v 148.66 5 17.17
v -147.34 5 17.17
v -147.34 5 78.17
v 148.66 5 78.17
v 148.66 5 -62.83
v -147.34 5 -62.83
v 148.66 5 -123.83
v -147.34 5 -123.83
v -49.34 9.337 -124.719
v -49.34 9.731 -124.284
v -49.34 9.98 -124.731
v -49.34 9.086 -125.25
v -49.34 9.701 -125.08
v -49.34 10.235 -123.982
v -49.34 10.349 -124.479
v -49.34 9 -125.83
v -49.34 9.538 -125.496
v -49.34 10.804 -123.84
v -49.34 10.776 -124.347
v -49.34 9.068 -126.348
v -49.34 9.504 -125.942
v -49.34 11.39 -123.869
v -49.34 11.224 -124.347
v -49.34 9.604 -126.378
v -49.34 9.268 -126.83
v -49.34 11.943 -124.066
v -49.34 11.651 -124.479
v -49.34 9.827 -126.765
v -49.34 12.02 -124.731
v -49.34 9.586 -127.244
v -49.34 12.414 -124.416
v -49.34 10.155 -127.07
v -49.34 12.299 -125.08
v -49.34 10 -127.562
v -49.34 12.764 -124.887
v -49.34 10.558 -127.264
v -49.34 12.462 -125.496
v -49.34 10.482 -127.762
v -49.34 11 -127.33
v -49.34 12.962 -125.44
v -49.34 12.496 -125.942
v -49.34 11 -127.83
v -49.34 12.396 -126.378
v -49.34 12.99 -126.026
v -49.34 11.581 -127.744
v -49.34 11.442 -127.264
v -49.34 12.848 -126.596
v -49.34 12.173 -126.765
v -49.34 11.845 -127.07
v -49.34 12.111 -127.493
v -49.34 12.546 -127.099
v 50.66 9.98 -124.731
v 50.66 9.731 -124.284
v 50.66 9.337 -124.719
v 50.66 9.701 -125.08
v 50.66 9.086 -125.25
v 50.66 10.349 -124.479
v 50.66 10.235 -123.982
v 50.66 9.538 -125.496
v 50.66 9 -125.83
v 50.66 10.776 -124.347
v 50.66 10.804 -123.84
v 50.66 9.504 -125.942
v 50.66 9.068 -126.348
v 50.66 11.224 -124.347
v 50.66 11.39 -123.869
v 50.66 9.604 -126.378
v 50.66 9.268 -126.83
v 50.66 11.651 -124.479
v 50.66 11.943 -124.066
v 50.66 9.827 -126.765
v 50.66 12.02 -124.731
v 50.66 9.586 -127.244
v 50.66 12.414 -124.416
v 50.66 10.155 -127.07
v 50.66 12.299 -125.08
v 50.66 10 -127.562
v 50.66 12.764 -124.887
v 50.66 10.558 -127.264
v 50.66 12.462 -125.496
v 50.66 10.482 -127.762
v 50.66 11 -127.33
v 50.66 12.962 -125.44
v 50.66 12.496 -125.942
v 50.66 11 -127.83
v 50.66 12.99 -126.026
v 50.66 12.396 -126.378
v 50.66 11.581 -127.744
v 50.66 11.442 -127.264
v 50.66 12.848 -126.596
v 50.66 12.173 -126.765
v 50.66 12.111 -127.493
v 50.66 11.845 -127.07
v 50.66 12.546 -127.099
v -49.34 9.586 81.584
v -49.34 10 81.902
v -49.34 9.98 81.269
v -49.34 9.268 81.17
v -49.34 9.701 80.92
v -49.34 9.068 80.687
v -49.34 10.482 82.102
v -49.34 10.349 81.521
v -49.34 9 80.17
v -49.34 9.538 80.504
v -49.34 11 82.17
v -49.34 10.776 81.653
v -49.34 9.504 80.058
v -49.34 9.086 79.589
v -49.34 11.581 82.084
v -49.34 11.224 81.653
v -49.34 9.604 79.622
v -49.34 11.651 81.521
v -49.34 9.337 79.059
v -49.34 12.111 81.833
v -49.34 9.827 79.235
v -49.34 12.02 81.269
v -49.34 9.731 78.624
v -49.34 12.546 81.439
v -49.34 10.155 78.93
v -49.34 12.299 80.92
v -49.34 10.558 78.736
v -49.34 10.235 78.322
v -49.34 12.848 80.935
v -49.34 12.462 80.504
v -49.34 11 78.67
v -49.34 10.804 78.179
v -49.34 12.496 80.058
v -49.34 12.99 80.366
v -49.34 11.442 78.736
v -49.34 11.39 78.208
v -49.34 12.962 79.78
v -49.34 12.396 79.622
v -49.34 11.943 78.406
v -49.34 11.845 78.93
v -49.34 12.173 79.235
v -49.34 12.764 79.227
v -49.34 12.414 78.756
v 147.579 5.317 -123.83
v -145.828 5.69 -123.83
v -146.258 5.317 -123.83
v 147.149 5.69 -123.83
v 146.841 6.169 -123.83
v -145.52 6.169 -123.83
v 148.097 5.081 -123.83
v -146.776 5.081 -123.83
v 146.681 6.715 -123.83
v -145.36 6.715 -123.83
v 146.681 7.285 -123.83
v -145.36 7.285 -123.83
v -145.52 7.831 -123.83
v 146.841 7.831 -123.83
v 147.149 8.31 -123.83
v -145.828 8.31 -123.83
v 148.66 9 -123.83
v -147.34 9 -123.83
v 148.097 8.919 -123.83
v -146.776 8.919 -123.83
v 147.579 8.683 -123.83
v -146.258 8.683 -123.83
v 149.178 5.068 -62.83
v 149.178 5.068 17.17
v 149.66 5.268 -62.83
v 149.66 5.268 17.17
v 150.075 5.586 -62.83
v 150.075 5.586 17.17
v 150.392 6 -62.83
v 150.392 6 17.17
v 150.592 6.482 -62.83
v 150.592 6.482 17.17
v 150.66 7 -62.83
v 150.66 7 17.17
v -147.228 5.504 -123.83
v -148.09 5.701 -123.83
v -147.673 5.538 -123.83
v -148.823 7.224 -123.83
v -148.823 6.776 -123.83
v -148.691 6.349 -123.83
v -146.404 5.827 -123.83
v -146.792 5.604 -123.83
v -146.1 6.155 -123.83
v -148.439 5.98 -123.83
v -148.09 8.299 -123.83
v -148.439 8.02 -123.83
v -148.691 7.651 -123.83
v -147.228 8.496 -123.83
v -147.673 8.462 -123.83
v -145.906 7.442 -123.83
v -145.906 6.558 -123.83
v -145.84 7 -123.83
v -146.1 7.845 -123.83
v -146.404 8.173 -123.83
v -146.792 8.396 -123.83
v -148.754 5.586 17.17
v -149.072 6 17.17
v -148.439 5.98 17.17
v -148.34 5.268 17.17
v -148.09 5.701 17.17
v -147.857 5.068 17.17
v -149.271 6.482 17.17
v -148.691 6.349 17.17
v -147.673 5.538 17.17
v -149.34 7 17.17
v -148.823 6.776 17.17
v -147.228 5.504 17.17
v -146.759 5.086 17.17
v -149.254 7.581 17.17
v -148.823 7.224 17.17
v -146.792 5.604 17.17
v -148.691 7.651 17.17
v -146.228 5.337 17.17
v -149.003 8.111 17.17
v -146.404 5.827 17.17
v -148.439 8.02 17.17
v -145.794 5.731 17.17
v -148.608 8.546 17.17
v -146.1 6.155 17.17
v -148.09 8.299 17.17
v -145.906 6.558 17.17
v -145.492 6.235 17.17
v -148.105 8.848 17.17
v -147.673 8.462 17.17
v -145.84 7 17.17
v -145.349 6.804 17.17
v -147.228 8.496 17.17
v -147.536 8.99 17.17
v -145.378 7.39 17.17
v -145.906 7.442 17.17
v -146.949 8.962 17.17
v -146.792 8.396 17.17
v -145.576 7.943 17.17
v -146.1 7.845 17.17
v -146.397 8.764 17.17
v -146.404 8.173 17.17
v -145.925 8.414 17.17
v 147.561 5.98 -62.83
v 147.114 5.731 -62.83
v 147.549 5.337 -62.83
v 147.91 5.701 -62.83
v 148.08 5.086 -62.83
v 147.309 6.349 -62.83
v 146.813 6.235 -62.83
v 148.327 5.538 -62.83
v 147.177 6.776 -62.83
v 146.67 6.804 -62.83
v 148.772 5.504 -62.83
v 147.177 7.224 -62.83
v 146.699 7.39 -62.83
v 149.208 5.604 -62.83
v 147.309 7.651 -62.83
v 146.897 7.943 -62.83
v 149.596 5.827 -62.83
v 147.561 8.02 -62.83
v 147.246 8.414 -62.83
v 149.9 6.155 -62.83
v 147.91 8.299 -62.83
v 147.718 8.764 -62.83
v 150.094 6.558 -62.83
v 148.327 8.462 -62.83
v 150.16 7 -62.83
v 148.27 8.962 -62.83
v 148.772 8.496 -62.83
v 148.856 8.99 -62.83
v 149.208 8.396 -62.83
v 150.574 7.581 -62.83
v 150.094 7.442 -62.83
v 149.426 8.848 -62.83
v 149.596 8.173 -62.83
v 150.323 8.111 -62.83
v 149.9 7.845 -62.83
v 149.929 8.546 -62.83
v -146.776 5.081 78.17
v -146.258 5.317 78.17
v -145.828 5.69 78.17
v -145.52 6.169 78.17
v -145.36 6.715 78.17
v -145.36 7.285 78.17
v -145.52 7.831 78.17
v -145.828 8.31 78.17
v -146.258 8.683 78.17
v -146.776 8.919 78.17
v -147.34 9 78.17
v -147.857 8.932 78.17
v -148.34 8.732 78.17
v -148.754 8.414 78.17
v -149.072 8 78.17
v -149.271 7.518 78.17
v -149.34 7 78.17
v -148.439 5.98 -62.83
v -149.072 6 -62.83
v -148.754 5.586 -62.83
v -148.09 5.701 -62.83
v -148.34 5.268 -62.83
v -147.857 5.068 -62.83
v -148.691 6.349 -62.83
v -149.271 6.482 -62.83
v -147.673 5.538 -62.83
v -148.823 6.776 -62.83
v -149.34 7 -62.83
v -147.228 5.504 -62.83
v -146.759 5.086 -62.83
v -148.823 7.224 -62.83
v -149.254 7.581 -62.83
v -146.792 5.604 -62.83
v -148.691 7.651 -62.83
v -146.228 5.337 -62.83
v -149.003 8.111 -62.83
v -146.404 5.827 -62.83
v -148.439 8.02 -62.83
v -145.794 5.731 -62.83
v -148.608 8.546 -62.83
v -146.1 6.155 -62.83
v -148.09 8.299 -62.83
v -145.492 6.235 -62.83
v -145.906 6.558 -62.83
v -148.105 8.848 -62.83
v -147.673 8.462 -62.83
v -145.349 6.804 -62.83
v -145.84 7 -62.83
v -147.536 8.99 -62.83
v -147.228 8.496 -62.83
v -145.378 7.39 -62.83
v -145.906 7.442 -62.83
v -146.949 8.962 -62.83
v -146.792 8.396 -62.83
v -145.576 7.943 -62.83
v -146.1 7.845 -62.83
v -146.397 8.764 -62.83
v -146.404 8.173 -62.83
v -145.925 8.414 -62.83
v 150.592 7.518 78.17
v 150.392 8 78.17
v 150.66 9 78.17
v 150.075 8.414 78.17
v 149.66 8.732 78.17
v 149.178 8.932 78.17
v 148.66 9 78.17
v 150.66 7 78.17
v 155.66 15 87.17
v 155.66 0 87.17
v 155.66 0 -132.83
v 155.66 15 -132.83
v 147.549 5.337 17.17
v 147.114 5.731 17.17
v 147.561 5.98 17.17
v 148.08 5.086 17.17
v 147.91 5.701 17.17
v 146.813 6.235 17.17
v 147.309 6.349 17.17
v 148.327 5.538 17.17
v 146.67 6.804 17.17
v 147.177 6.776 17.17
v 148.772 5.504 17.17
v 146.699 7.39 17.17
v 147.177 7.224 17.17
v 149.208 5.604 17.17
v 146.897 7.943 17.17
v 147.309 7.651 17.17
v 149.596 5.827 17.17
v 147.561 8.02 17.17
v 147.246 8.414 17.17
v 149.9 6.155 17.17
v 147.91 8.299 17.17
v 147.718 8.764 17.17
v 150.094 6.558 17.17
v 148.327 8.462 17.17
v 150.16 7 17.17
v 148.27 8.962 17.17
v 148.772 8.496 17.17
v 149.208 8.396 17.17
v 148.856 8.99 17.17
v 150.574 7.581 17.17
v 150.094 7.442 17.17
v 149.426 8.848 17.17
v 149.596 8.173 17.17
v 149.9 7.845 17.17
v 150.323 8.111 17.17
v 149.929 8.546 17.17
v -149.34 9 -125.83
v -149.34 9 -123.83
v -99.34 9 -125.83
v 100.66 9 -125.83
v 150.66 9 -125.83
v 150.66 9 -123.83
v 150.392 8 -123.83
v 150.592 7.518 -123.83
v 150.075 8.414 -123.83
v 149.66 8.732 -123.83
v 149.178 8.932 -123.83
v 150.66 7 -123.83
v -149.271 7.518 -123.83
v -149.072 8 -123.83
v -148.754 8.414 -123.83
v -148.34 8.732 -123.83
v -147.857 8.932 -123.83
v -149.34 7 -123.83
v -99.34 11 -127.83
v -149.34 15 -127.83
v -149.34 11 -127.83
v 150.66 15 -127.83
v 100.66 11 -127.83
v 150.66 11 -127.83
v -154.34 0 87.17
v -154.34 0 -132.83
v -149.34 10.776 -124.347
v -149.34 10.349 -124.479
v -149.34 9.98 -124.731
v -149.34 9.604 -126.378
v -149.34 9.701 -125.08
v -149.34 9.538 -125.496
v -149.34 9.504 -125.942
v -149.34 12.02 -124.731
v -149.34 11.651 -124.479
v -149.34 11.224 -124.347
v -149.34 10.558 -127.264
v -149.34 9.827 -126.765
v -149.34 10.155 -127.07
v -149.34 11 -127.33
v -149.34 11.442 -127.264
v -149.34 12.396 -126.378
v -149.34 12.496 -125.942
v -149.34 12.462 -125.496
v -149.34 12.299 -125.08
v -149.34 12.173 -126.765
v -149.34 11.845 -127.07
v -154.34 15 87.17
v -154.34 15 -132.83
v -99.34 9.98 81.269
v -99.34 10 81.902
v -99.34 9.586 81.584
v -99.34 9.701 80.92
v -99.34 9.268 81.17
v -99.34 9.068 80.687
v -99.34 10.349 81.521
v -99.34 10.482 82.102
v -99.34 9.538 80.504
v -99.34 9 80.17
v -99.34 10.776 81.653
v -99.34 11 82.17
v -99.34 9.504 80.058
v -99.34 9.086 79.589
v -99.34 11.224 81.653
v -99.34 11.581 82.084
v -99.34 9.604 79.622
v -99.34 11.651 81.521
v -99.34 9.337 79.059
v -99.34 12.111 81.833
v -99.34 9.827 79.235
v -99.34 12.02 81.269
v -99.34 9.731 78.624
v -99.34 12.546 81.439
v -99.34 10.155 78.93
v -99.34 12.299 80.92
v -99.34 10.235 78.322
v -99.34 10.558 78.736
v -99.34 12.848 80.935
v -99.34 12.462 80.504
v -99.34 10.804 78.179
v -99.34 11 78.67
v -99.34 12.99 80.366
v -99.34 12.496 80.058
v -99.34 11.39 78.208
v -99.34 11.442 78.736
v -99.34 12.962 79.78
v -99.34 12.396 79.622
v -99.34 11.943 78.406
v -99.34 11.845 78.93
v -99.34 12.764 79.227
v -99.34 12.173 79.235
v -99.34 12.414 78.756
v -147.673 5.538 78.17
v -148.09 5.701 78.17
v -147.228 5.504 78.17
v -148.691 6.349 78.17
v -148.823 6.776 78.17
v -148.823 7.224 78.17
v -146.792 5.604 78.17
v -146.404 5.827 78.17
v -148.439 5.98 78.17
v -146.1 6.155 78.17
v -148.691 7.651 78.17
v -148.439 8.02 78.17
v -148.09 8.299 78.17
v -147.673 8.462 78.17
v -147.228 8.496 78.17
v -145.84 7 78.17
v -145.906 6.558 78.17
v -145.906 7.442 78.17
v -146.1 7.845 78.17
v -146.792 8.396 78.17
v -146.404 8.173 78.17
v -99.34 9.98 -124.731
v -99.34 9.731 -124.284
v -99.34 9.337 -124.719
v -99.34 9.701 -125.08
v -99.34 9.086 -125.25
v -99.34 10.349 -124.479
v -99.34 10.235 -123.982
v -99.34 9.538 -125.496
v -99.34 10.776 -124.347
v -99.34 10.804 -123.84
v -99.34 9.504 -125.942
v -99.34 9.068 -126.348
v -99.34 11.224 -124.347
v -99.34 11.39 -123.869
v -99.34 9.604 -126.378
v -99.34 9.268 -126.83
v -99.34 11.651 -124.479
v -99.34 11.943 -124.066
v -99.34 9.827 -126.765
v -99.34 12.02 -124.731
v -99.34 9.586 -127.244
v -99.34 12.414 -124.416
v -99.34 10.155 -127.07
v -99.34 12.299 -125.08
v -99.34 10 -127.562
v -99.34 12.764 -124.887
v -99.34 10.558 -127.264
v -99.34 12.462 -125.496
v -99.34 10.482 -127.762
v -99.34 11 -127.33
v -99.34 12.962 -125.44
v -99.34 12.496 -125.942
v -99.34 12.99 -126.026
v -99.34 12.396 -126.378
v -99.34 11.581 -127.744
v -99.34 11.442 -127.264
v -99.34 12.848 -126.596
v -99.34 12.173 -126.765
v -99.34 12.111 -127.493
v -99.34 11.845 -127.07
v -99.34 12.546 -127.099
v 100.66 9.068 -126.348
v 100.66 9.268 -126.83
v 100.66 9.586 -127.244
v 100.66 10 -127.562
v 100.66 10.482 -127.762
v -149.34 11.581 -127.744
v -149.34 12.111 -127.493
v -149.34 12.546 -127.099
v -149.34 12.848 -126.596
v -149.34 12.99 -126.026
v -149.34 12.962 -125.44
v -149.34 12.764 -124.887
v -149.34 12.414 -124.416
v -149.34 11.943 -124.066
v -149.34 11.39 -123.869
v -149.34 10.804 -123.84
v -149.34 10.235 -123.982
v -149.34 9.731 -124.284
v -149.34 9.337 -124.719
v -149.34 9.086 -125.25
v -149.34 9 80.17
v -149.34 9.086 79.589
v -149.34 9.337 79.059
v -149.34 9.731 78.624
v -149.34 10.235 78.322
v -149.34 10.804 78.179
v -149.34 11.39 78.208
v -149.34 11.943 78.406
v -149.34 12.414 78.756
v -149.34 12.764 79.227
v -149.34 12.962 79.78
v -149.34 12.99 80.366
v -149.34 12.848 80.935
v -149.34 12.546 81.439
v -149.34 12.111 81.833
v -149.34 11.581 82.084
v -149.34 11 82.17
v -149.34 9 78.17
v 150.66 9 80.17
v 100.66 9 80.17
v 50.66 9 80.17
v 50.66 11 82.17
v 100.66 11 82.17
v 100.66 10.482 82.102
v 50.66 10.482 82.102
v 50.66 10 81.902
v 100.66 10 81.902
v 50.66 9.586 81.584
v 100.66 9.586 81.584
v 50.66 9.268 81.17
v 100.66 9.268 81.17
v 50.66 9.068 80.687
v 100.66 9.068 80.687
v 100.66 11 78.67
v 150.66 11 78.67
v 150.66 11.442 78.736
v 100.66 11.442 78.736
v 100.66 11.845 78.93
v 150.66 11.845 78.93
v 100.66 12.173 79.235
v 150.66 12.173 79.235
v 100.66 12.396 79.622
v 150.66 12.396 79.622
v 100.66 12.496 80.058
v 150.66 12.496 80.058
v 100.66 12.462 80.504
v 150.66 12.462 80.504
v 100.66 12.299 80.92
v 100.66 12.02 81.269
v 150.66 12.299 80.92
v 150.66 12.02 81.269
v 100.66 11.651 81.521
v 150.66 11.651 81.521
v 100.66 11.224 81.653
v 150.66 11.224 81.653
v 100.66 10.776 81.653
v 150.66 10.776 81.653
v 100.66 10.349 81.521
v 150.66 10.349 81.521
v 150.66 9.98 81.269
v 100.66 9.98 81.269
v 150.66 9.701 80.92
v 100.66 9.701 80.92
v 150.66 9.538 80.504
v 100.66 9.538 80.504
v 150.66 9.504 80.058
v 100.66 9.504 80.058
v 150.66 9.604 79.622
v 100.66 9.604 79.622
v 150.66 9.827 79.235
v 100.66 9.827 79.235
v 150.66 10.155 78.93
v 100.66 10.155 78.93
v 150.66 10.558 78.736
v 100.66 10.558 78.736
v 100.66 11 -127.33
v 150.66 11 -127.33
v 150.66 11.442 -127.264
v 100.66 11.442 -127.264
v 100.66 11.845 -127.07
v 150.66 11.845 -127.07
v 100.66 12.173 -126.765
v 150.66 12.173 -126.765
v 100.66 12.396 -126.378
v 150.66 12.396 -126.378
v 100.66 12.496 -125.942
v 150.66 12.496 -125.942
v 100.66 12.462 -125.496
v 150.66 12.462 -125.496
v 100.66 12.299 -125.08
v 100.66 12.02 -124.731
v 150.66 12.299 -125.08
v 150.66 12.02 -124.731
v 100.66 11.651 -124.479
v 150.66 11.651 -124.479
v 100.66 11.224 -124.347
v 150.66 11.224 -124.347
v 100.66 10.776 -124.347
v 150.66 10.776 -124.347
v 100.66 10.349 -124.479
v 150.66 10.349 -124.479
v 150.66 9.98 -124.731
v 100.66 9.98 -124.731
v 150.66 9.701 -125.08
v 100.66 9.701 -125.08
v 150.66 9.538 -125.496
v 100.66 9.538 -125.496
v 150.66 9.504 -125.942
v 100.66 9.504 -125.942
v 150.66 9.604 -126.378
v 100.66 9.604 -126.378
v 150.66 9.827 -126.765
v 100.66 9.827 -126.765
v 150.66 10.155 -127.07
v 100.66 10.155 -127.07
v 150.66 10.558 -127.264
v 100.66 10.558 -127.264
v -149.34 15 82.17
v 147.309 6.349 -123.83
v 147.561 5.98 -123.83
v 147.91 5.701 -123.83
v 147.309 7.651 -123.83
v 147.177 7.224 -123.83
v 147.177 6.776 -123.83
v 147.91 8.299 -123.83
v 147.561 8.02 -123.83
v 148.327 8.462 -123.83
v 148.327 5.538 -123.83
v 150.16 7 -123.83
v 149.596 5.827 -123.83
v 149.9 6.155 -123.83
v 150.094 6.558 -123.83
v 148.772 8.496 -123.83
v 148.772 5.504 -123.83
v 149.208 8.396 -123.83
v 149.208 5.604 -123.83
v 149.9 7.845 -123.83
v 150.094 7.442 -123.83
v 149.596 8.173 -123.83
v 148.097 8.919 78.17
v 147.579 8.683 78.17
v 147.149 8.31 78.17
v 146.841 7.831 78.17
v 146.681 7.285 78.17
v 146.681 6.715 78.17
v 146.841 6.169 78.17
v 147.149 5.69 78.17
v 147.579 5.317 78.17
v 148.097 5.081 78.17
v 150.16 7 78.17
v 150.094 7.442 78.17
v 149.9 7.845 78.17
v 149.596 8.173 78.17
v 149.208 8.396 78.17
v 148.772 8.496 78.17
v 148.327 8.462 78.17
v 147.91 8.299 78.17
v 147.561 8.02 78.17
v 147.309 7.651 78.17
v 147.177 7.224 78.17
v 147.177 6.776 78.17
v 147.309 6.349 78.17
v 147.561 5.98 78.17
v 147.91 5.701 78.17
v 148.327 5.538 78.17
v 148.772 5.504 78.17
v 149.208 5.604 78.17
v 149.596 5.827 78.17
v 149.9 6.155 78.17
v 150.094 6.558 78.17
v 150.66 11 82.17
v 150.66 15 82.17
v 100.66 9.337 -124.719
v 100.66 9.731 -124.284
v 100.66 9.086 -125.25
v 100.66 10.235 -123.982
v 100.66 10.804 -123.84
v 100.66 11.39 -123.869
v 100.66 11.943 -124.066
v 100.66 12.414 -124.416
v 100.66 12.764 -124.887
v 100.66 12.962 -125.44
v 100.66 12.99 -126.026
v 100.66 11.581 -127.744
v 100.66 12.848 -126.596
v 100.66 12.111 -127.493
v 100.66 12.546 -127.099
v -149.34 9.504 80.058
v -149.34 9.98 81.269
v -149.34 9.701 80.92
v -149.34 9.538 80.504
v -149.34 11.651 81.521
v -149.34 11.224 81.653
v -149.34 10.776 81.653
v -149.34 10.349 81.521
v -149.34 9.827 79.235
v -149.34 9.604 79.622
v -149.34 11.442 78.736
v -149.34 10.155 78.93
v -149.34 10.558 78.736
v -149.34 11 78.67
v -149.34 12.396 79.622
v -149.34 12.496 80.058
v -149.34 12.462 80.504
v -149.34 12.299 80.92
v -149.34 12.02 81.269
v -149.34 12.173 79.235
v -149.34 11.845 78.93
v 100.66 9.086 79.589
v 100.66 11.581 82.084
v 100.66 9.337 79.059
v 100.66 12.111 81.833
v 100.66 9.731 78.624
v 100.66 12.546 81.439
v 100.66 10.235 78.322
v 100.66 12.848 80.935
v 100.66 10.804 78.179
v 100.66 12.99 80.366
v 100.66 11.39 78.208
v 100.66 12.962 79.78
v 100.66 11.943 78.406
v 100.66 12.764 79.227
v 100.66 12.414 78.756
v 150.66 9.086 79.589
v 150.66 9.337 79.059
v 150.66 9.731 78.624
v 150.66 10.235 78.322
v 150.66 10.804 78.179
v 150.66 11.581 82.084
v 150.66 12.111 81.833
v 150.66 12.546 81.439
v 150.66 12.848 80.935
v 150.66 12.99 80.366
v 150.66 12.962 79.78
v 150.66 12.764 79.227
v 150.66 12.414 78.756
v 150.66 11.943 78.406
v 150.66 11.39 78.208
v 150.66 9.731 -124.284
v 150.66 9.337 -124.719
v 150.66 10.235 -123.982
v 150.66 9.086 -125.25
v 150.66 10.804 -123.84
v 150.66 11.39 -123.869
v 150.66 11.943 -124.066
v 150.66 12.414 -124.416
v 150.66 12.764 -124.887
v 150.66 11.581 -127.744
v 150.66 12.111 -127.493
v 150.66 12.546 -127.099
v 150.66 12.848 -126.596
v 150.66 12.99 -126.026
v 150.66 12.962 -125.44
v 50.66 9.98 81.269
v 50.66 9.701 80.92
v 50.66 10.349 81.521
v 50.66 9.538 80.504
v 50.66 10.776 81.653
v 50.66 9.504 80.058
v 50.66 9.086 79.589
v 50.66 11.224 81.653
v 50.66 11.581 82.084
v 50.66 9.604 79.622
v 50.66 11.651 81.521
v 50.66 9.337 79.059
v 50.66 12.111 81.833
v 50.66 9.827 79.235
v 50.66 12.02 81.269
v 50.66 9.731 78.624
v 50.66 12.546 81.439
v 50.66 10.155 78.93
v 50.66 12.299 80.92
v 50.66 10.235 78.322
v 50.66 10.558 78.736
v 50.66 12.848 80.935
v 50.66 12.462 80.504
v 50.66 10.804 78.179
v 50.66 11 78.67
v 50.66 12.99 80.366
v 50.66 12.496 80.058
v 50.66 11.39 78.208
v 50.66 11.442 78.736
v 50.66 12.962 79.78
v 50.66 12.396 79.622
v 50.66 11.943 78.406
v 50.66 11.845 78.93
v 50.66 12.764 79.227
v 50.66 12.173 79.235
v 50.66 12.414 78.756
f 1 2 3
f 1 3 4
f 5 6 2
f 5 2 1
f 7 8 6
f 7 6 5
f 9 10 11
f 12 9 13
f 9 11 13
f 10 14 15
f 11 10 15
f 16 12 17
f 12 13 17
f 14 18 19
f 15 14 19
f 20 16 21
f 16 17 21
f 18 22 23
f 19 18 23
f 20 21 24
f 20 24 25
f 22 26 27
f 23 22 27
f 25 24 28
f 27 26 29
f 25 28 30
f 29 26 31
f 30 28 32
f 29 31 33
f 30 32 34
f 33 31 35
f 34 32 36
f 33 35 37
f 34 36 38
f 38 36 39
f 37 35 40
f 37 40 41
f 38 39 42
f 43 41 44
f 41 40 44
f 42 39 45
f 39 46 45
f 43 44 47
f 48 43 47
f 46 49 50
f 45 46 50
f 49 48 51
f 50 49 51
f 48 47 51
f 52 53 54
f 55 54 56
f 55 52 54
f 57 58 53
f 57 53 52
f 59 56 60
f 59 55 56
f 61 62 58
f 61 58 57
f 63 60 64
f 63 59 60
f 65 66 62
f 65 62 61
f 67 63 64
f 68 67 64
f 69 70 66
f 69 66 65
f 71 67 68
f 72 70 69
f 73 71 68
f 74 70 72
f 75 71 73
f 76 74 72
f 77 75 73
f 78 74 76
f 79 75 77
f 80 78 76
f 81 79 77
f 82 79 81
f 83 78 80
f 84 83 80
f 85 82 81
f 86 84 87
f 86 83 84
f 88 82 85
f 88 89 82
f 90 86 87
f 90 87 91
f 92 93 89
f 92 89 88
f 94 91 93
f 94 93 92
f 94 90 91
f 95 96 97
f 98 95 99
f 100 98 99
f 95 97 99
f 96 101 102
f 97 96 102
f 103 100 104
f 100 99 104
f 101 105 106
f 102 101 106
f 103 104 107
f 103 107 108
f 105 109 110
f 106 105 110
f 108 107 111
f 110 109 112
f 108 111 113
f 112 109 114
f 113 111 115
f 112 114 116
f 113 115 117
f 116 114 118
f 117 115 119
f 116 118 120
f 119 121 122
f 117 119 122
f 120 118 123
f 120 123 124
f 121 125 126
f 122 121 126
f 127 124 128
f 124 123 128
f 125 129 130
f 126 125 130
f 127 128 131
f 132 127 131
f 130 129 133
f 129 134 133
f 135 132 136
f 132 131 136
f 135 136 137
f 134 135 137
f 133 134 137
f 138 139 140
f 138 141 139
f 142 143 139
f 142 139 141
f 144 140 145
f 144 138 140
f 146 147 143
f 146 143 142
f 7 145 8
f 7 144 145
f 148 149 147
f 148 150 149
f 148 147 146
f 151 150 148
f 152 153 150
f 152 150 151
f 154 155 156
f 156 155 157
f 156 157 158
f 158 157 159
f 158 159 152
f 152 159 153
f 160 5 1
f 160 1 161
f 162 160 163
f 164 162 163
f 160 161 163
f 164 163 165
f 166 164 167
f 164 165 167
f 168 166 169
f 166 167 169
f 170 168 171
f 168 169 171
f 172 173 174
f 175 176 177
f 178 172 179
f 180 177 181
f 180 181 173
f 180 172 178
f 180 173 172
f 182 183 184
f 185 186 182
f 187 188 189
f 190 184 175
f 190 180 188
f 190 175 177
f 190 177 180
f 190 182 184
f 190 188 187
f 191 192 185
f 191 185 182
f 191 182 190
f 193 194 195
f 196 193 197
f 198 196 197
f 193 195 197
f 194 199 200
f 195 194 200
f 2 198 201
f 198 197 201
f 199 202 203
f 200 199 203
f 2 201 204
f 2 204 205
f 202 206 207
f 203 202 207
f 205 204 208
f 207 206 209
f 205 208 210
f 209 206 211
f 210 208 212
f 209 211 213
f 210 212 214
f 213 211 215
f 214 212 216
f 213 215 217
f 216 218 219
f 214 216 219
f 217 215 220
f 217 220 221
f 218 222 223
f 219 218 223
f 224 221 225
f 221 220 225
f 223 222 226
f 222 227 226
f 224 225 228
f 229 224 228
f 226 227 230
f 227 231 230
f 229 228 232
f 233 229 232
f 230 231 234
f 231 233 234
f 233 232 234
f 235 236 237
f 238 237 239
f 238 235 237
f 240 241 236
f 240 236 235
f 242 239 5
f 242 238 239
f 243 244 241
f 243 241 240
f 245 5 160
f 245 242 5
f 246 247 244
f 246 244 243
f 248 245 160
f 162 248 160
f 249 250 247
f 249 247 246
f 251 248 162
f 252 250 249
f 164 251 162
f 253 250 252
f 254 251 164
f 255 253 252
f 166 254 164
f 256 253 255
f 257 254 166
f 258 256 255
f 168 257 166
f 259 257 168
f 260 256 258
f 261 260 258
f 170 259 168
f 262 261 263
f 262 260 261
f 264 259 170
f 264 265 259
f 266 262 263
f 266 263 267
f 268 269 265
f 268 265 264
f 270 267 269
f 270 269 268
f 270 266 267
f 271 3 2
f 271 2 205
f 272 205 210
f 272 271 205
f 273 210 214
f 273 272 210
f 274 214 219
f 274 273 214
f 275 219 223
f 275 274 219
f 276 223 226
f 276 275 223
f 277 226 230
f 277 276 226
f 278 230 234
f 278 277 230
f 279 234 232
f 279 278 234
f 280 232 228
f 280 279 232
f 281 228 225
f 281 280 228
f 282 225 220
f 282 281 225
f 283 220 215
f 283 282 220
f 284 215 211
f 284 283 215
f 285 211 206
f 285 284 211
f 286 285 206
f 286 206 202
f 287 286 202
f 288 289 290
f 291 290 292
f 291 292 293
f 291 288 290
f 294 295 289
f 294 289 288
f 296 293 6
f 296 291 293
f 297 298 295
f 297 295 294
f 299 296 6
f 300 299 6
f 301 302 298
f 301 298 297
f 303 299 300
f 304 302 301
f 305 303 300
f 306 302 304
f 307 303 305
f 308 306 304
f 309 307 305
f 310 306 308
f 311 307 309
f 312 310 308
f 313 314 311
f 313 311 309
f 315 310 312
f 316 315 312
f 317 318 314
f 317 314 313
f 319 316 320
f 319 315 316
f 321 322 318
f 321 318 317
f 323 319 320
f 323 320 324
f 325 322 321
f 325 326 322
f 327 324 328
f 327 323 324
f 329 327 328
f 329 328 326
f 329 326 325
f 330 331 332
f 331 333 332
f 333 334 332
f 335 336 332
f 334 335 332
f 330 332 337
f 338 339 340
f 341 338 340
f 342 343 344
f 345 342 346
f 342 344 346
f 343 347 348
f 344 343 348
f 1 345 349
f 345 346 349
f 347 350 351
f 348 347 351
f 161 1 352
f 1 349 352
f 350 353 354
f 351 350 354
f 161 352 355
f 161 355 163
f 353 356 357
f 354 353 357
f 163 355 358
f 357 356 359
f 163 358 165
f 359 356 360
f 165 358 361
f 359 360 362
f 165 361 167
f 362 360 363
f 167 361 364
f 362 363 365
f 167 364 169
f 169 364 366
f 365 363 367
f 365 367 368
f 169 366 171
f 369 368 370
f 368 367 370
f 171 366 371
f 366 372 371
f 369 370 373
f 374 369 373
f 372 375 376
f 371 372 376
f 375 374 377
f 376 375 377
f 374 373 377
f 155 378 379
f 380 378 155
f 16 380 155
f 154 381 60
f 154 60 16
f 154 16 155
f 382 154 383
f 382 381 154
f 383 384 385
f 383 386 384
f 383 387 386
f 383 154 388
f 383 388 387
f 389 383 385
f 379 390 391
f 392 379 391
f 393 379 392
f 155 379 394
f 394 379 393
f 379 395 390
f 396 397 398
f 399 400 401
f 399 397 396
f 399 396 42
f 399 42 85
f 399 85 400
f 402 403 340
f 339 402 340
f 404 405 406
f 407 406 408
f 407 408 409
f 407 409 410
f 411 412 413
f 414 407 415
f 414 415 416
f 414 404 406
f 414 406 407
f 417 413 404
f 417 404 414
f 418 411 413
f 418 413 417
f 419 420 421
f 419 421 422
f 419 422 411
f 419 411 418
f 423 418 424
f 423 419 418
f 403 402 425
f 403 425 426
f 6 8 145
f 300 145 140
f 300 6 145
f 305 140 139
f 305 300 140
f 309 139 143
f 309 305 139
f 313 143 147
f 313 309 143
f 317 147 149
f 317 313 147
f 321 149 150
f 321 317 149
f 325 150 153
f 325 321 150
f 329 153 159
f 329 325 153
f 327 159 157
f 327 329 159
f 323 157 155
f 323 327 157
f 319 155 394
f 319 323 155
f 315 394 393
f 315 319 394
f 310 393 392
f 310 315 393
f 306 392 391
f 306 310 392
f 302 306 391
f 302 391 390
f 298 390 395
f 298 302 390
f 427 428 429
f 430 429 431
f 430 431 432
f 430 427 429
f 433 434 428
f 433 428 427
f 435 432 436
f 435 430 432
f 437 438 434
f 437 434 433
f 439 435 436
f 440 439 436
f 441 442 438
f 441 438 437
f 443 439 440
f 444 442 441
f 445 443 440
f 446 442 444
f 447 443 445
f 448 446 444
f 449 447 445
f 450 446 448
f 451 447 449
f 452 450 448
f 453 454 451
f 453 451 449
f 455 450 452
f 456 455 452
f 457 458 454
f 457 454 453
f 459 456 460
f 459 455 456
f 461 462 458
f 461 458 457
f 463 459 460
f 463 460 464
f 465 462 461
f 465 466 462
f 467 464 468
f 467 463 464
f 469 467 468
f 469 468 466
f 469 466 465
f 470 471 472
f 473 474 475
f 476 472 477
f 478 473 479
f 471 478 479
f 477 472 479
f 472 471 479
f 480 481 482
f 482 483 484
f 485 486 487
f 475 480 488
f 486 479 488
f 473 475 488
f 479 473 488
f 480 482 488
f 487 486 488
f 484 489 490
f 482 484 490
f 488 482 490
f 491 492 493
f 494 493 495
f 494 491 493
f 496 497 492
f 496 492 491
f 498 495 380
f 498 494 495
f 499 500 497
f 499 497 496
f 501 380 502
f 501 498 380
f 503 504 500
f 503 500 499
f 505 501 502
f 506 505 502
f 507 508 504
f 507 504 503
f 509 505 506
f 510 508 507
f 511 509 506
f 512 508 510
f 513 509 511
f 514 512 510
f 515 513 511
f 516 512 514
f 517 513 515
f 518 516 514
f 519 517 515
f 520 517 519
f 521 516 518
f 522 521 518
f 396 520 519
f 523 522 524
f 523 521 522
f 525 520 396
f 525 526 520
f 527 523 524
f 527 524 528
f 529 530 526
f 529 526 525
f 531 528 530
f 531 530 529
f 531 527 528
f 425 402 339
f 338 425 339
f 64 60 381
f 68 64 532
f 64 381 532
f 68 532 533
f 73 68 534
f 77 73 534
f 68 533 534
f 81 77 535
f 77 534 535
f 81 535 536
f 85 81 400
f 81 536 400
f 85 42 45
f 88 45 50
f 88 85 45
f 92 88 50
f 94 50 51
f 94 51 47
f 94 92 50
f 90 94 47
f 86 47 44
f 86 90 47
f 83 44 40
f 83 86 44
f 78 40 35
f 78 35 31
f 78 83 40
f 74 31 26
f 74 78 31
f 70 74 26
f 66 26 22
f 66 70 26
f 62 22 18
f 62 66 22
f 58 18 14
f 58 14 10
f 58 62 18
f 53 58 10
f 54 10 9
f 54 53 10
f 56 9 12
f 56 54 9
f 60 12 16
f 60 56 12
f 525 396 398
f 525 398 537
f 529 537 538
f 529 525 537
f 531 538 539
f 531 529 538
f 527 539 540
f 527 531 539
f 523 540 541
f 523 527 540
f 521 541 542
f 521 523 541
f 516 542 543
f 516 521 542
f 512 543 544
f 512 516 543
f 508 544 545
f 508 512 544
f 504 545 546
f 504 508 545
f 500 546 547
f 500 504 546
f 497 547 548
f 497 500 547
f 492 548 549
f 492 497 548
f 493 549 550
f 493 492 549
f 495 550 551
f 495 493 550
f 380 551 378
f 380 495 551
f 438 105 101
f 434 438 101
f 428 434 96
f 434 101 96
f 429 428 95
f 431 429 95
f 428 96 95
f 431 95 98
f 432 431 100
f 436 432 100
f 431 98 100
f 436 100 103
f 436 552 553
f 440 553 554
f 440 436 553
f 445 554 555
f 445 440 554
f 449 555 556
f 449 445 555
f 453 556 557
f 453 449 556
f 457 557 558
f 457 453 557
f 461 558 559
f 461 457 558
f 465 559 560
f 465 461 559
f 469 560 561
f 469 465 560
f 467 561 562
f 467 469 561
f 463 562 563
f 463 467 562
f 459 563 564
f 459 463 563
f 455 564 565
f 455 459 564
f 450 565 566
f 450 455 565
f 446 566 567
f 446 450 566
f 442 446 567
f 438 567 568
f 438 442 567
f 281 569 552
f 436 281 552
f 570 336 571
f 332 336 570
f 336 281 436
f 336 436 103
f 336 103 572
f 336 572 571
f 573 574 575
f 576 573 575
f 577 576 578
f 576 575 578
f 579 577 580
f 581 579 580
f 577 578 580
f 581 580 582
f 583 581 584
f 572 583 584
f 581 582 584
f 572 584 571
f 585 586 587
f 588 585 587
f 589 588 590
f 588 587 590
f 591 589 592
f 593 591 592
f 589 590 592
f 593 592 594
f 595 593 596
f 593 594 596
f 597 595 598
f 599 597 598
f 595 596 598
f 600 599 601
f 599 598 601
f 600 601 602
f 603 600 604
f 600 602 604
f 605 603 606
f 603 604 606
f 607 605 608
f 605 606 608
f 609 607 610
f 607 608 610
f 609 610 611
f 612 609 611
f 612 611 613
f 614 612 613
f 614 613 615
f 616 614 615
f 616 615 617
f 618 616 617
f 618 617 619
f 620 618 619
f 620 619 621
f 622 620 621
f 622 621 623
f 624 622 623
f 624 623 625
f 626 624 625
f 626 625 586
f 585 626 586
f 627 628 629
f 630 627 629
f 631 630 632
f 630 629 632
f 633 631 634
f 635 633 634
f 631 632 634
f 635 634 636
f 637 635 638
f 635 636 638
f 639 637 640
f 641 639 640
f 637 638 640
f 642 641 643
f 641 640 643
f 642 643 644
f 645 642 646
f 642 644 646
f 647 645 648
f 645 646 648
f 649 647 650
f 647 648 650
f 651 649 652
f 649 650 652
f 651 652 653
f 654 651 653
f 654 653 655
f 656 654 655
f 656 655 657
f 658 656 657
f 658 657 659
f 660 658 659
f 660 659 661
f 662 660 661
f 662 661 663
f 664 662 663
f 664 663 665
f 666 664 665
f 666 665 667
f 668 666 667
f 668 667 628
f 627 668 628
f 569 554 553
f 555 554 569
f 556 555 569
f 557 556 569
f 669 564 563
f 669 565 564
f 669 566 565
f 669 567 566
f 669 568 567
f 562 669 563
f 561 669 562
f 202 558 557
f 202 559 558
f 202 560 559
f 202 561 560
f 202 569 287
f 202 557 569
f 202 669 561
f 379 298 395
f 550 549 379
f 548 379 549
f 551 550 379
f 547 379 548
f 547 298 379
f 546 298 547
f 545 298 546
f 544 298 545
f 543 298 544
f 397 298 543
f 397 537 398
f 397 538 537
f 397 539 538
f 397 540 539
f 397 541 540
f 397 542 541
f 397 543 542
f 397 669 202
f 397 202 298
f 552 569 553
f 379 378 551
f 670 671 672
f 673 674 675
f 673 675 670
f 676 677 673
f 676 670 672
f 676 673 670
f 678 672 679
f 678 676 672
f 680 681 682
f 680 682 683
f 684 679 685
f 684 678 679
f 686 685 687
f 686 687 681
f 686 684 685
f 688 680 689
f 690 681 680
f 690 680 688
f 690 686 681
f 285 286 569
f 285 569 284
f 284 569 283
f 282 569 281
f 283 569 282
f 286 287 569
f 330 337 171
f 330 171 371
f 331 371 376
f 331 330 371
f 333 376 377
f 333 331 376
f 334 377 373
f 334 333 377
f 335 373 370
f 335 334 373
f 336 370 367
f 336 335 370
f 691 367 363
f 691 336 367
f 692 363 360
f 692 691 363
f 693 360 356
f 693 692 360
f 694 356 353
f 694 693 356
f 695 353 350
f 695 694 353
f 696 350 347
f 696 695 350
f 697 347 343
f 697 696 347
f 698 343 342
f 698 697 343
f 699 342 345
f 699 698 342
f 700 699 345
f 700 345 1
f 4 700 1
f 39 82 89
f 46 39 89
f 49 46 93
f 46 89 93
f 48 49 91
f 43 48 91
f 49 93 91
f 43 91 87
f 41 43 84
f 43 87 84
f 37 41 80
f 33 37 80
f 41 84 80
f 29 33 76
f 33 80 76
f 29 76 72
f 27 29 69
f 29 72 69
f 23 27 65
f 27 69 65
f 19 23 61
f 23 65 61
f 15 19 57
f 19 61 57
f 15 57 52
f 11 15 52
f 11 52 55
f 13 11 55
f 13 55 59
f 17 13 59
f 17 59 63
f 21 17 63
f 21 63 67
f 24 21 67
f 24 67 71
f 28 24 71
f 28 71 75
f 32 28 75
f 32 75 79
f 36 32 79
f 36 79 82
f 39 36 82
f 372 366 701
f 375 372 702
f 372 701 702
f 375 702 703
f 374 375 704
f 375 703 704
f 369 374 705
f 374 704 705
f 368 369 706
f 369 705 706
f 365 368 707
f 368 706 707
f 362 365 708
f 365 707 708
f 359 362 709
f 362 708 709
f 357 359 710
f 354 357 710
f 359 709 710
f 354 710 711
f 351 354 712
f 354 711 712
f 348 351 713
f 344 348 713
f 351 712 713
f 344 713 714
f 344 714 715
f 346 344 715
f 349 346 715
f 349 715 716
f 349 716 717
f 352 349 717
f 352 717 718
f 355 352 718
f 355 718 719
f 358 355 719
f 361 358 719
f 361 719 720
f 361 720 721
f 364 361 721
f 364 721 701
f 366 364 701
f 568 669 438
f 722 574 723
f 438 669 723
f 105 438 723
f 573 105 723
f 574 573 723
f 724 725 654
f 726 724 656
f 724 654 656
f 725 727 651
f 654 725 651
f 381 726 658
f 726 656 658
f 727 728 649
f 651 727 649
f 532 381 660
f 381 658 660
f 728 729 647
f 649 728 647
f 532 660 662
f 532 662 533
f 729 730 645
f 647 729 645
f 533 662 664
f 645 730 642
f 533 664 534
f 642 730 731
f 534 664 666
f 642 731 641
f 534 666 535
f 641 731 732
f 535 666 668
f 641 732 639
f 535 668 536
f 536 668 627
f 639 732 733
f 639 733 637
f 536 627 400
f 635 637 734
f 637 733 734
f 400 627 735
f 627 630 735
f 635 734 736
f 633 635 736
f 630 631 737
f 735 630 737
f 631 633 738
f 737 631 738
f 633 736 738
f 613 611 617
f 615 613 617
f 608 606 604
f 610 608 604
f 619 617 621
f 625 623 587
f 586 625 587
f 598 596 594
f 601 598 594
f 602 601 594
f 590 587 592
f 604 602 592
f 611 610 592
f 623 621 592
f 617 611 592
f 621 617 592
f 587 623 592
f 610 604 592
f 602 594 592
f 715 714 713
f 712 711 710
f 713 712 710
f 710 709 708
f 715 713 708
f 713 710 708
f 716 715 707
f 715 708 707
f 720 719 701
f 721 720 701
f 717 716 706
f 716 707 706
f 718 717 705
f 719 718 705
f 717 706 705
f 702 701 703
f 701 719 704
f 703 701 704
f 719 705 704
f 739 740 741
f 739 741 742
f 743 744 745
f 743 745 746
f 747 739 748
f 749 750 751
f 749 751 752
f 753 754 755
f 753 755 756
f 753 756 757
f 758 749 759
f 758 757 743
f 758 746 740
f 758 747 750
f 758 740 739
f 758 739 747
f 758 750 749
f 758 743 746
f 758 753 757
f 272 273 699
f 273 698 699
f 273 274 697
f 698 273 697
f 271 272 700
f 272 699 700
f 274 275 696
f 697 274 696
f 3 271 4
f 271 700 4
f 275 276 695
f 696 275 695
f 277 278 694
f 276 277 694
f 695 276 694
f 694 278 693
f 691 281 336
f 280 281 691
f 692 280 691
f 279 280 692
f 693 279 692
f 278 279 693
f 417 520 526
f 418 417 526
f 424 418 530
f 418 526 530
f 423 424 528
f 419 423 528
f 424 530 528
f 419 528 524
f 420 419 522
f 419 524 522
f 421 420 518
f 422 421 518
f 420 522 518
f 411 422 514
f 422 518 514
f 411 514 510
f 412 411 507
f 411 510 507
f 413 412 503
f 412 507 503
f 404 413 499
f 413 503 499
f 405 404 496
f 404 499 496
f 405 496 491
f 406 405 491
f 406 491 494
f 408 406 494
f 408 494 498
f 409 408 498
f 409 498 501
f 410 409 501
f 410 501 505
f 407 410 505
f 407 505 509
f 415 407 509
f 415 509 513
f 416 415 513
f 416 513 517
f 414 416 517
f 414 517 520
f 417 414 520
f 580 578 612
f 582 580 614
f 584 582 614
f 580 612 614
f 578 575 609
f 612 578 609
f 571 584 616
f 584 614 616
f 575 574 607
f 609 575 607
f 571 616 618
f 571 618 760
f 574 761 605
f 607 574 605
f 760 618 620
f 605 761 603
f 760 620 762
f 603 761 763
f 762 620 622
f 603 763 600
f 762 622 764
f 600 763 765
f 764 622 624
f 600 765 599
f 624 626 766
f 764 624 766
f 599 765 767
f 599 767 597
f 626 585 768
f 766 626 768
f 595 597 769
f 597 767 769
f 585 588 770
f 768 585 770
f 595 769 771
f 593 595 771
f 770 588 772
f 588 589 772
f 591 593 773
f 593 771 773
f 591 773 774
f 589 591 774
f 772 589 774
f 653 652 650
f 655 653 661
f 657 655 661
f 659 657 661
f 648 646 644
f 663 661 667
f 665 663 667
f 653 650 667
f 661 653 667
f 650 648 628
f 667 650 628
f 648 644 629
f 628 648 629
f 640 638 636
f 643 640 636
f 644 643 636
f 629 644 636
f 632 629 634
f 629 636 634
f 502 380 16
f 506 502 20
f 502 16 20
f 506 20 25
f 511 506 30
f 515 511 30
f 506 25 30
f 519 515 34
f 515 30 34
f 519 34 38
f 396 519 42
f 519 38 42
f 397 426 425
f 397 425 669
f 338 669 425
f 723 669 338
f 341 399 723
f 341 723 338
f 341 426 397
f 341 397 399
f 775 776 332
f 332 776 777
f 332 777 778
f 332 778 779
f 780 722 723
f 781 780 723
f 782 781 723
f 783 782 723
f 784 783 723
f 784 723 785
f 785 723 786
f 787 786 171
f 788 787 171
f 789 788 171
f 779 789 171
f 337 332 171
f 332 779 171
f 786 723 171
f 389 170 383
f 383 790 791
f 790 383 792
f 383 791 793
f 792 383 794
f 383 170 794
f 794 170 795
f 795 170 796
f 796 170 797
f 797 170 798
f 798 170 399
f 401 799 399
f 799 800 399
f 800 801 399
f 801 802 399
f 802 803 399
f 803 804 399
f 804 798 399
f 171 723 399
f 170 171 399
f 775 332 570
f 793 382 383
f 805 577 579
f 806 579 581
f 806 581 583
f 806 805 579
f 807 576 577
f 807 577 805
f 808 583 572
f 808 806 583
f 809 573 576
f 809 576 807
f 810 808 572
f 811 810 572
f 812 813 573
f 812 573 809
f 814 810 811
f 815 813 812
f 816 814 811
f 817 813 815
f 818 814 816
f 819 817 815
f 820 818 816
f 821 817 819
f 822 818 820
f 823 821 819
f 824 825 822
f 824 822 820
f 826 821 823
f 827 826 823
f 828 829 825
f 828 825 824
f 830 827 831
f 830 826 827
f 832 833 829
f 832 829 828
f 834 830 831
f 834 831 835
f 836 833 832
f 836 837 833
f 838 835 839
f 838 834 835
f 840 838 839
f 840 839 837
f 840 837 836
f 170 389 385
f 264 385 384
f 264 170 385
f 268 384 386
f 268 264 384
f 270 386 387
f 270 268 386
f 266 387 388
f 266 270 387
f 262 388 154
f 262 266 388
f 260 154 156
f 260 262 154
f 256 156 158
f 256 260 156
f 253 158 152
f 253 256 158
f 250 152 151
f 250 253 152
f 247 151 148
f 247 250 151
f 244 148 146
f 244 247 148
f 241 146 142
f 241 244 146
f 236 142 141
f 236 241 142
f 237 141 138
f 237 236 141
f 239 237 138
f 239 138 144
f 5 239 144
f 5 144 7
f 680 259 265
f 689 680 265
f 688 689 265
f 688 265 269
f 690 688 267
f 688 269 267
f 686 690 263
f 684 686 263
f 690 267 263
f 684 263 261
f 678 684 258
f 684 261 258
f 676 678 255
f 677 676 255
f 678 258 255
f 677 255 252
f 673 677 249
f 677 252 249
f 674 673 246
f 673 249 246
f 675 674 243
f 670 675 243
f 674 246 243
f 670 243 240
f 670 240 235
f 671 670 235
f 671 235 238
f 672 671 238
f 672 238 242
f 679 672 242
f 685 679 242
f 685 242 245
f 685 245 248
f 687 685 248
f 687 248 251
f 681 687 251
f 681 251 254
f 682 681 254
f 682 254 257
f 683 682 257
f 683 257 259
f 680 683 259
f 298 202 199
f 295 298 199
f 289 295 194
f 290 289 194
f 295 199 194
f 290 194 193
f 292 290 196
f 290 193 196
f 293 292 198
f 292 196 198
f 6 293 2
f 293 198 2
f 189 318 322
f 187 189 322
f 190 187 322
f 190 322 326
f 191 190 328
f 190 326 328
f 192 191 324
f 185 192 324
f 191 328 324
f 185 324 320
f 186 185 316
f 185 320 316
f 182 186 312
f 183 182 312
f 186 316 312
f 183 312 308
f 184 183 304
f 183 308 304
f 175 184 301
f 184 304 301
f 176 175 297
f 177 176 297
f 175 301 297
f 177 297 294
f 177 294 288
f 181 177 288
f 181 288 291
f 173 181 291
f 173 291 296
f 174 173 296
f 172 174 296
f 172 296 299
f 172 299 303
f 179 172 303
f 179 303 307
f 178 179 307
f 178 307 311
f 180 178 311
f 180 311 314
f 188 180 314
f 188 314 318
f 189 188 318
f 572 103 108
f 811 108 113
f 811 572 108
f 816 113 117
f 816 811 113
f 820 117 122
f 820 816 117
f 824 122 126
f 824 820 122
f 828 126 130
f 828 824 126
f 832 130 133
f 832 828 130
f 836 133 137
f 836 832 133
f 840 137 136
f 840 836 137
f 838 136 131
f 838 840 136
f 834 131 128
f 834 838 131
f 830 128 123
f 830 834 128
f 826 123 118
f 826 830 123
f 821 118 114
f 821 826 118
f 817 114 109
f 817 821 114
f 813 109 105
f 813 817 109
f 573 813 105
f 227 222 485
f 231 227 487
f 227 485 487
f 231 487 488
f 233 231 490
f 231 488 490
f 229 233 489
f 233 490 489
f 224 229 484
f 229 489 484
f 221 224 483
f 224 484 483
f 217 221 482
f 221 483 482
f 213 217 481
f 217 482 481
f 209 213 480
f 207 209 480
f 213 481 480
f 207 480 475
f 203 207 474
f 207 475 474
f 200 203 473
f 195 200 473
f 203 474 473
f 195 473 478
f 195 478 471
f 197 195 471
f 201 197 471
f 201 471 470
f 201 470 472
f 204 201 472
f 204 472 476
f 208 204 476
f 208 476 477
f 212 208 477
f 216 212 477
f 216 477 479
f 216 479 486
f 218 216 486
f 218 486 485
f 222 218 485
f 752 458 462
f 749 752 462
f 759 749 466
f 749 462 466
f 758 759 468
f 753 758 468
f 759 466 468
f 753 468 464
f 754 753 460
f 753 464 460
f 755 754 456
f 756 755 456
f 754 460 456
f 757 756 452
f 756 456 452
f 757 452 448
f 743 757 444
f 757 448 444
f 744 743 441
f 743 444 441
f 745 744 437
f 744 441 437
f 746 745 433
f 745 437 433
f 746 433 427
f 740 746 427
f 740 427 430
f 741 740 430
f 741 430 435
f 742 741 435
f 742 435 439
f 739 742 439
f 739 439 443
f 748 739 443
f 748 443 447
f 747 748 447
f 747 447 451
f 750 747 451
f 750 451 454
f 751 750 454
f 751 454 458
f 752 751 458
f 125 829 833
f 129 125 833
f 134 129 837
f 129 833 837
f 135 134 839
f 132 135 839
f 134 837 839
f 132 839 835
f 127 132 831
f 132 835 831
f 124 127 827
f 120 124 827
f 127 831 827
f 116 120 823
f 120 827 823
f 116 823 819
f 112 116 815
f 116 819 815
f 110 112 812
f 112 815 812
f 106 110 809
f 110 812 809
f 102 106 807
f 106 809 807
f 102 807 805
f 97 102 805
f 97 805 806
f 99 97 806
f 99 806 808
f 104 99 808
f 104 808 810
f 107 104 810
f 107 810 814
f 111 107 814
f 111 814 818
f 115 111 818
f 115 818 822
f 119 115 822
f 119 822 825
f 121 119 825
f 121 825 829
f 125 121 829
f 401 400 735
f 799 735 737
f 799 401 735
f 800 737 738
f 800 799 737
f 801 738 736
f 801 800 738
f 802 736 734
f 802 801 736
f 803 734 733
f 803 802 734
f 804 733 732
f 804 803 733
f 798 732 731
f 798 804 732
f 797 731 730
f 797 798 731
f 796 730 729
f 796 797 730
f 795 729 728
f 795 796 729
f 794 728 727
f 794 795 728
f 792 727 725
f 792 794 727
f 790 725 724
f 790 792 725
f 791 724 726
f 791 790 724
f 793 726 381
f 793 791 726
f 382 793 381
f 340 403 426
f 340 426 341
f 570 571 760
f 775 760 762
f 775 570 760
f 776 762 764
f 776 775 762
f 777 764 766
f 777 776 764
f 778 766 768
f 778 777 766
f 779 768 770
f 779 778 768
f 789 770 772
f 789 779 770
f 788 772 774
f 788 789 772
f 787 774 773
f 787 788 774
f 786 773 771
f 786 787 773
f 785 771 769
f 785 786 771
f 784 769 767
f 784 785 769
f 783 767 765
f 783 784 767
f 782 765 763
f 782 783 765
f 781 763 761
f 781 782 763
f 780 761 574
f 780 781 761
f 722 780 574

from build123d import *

# Parameters (mm, degrees)
SKETCH_1_W           = 310
SKETCH_1_H           = 220
EXTRUDE_1_DEPTH      = 15
SKETCH_2_W           = 300
SKETCH_2_H           = 210
CUT_EXTRUDE_4_DEPTH  = 6
SKETCH_6_W           = 300
SKETCH_6_H           = 2
EXTRUDE_3_DEPTH      = 2
SKETCH_8_R           = 2
CUT_EXTRUDE_5_DEPTH  = 300
SKETCH_8_2_R         = 2
SKETCH_8_2_R_2       = 1.5
EXTRUDE_1_2_DEPTH    = 300
SKETCH_10_R          = 2
CUT_EXTRUDE_6_DEPTH  = 300
SKETCH_10_2_R        = 2
SKETCH_10_2_R_2      = 1.5
EXTRUDE_2_DEPTH      = 300
SKETCH_12_R          = 2
CUT_EXTRUDE_7_DEPTH  = 50
SKETCH_13_R          = 2
CUT_EXTRUDE_8_DEPTH  = 50
SKETCH_15_W          = 300
SKETCH_15_H          = 202
CUT_EXTRUDE_9_DEPTH  = 4
SKETCH_16_W          = 2
SKETCH_16_H          = 202
EXTRUDE_4_DEPTH      = 2
SKETCH_14_R          = 2
CUT_EXTRUDE_10_DEPTH = 202
SKETCH_14_2_R        = 2
SKETCH_14_2_R_2      = 1.5
EXTRUDE_3_2_DEPTH    = 202
SKETCH_18_R          = 2
CUT_EXTRUDE_11_DEPTH = 80


with BuildPart() as part:
    # 草图1 → Extrude 1 (new body)
    with BuildSketch(Plane(origin=(0, 0, 0), x_dir=(1, 0, 0), z_dir=(0, 1, 0))):
        with Locations((0.660377358, 22.830188679)):
            Rectangle(SKETCH_1_W, SKETCH_1_H)
    extrude(amount=EXTRUDE_1_DEPTH)

    # 草图2 → 切除-拉伸4 (cut)
    with BuildSketch(Plane(origin=(0, 15, 0), x_dir=(1, 0, 0), z_dir=(0, 1, 0))):
        with Locations((0.660377358, 22.830188679)):
            Rectangle(SKETCH_2_W, SKETCH_2_H)
    extrude(amount=-CUT_EXTRUDE_4_DEPTH, mode=Mode.SUBTRACT)

    # 草图6 → Extrude 3 (add)
    with BuildSketch(Plane(origin=(0, 9, 0), x_dir=(1, 0, 0), z_dir=(0, 1, 0))):
        with Locations((0.660377358, 126.830188679)):
            Rectangle(SKETCH_6_W, SKETCH_6_H)
        with Locations((0.660377358, -81.169811321)):
            Rectangle(SKETCH_6_W, SKETCH_6_H)
    extrude(amount=EXTRUDE_3_DEPTH)

    # 草图8 → 切除-拉伸5 (cut)
    with BuildSketch(Plane(origin=(150.660377358, 0, 0), x_dir=(0, 0, -1), z_dir=(1, 0, 0))):
        with Locations((-80.169811321, 11)):
            Circle(SKETCH_8_R)
    extrude(amount=-CUT_EXTRUDE_5_DEPTH, mode=Mode.SUBTRACT)

    # 草图8<2> → Extrude 1 2 (add)
    with BuildSketch(Plane(origin=(150.660377358, 0, 0), x_dir=(0, 0, -1), z_dir=(1, 0, 0))):
        with Locations((-80.169811321, 11)):
            Circle(SKETCH_8_2_R)
        with Locations((-80.169811321, 11)):
            Circle(SKETCH_8_2_R_2, mode=Mode.SUBTRACT)
    extrude(amount=-EXTRUDE_1_2_DEPTH)

    # 草图10 → 切除-拉伸6 (cut)
    with BuildSketch(Plane(origin=(150.660377358, 0, 0), x_dir=(0, 0, -1), z_dir=(1, 0, 0))):
        with Locations((125.830188679, 11)):
            Circle(SKETCH_10_R)
    extrude(amount=-CUT_EXTRUDE_6_DEPTH, mode=Mode.SUBTRACT)

    # 草图10<2> → 拉伸-薄壁2 (add)
    with BuildSketch(Plane(origin=(150.660377358, 0, 0), x_dir=(0, 0, -1), z_dir=(1, 0, 0))):
        with Locations((125.830188679, 11)):
            Circle(SKETCH_10_2_R)
        with Locations((125.830188679, 11)):
            Circle(SKETCH_10_2_R_2, mode=Mode.SUBTRACT)
    extrude(amount=-EXTRUDE_2_DEPTH)

    # 草图12 → 切除-拉伸7 (cut)
    with BuildSketch(Plane(origin=(100.660377358, 0, 0), x_dir=(0, 0, -1), z_dir=(1, 0, 0))):
        with Locations((-80.169811321, 11)):
            Circle(SKETCH_12_R)
        with Locations((125.830188679, 11)):
            Circle(SKETCH_12_R)
    extrude(amount=-CUT_EXTRUDE_7_DEPTH, mode=Mode.SUBTRACT)

    # 草图13 → 切除-拉伸8 (cut)
    with BuildSketch(Plane(origin=(-49.339622642, 0, 0), x_dir=(0, 0, -1), z_dir=(1, 0, 0))):
        with Locations((-80.169811321, 11)):
            Circle(SKETCH_13_R)
        with Locations((125.830188679, 11)):
            Circle(SKETCH_13_R)
    extrude(amount=-CUT_EXTRUDE_8_DEPTH, mode=Mode.SUBTRACT)

    # 草图15 → 切除-拉伸9 (cut)
    with BuildSketch(Plane(origin=(0, 9, 0), x_dir=(1, 0, 0), z_dir=(0, 1, 0))):
        with Locations((0.660377358, 22.830188679)):
            Rectangle(SKETCH_15_W, SKETCH_15_H)
    extrude(amount=-CUT_EXTRUDE_9_DEPTH, mode=Mode.SUBTRACT)

    # 草图16 → 凸台-拉伸4 (add)
    with BuildSketch(Plane(origin=(0, 5, 0), x_dir=(1, 0, 0), z_dir=(0, 1, 0))):
        with Locations((-148.339622642, 22.830188679)):
            Rectangle(SKETCH_16_W, SKETCH_16_H)
        with Locations((149.660377358, 22.830188679)):
            Rectangle(SKETCH_16_W, SKETCH_16_H)
    extrude(amount=EXTRUDE_4_DEPTH)

    # 草图14 → 切除-拉伸10 (cut)
    with BuildSketch(Plane.XY.offset(78.169811321)):
        with Locations((-147.339622642, 7)):
            Circle(SKETCH_14_R)
        with Locations((148.660377358, 7)):
            Circle(SKETCH_14_R)
    extrude(amount=-CUT_EXTRUDE_10_DEPTH, mode=Mode.SUBTRACT)

    # 草图14<2> → Extrude 3 2 (add)
    # profile 1 of 2: a face of its own
    with BuildSketch(Plane.XY.offset(78.169811321)):
        with Locations((-147.339622642, 7)):
            Circle(SKETCH_14_2_R)
        with Locations((-147.339622642, 7)):
            Circle(SKETCH_14_2_R_2, mode=Mode.SUBTRACT)
    # profile 2 of 2: a face of its own
    with BuildSketch(Plane.XY.offset(78.169811321)):
        with Locations((148.660377358, 7)):
            Circle(SKETCH_14_2_R)
        with Locations((148.660377358, 7)):
            Circle(SKETCH_14_2_R_2, mode=Mode.SUBTRACT)
    extrude(amount=-EXTRUDE_3_2_DEPTH)

    # 草图18 → 切除-拉伸11 (cut)
    with BuildSketch(Plane.XY.offset(17.169811321)):
        with Locations((-147.339622642, 7)):
            Circle(SKETCH_18_R)
        with Locations((148.660377358, 7)):
            Circle(SKETCH_18_R)
    extrude(amount=-CUT_EXTRUDE_11_DEPTH, mode=Mode.SUBTRACT)


solid = part.part
